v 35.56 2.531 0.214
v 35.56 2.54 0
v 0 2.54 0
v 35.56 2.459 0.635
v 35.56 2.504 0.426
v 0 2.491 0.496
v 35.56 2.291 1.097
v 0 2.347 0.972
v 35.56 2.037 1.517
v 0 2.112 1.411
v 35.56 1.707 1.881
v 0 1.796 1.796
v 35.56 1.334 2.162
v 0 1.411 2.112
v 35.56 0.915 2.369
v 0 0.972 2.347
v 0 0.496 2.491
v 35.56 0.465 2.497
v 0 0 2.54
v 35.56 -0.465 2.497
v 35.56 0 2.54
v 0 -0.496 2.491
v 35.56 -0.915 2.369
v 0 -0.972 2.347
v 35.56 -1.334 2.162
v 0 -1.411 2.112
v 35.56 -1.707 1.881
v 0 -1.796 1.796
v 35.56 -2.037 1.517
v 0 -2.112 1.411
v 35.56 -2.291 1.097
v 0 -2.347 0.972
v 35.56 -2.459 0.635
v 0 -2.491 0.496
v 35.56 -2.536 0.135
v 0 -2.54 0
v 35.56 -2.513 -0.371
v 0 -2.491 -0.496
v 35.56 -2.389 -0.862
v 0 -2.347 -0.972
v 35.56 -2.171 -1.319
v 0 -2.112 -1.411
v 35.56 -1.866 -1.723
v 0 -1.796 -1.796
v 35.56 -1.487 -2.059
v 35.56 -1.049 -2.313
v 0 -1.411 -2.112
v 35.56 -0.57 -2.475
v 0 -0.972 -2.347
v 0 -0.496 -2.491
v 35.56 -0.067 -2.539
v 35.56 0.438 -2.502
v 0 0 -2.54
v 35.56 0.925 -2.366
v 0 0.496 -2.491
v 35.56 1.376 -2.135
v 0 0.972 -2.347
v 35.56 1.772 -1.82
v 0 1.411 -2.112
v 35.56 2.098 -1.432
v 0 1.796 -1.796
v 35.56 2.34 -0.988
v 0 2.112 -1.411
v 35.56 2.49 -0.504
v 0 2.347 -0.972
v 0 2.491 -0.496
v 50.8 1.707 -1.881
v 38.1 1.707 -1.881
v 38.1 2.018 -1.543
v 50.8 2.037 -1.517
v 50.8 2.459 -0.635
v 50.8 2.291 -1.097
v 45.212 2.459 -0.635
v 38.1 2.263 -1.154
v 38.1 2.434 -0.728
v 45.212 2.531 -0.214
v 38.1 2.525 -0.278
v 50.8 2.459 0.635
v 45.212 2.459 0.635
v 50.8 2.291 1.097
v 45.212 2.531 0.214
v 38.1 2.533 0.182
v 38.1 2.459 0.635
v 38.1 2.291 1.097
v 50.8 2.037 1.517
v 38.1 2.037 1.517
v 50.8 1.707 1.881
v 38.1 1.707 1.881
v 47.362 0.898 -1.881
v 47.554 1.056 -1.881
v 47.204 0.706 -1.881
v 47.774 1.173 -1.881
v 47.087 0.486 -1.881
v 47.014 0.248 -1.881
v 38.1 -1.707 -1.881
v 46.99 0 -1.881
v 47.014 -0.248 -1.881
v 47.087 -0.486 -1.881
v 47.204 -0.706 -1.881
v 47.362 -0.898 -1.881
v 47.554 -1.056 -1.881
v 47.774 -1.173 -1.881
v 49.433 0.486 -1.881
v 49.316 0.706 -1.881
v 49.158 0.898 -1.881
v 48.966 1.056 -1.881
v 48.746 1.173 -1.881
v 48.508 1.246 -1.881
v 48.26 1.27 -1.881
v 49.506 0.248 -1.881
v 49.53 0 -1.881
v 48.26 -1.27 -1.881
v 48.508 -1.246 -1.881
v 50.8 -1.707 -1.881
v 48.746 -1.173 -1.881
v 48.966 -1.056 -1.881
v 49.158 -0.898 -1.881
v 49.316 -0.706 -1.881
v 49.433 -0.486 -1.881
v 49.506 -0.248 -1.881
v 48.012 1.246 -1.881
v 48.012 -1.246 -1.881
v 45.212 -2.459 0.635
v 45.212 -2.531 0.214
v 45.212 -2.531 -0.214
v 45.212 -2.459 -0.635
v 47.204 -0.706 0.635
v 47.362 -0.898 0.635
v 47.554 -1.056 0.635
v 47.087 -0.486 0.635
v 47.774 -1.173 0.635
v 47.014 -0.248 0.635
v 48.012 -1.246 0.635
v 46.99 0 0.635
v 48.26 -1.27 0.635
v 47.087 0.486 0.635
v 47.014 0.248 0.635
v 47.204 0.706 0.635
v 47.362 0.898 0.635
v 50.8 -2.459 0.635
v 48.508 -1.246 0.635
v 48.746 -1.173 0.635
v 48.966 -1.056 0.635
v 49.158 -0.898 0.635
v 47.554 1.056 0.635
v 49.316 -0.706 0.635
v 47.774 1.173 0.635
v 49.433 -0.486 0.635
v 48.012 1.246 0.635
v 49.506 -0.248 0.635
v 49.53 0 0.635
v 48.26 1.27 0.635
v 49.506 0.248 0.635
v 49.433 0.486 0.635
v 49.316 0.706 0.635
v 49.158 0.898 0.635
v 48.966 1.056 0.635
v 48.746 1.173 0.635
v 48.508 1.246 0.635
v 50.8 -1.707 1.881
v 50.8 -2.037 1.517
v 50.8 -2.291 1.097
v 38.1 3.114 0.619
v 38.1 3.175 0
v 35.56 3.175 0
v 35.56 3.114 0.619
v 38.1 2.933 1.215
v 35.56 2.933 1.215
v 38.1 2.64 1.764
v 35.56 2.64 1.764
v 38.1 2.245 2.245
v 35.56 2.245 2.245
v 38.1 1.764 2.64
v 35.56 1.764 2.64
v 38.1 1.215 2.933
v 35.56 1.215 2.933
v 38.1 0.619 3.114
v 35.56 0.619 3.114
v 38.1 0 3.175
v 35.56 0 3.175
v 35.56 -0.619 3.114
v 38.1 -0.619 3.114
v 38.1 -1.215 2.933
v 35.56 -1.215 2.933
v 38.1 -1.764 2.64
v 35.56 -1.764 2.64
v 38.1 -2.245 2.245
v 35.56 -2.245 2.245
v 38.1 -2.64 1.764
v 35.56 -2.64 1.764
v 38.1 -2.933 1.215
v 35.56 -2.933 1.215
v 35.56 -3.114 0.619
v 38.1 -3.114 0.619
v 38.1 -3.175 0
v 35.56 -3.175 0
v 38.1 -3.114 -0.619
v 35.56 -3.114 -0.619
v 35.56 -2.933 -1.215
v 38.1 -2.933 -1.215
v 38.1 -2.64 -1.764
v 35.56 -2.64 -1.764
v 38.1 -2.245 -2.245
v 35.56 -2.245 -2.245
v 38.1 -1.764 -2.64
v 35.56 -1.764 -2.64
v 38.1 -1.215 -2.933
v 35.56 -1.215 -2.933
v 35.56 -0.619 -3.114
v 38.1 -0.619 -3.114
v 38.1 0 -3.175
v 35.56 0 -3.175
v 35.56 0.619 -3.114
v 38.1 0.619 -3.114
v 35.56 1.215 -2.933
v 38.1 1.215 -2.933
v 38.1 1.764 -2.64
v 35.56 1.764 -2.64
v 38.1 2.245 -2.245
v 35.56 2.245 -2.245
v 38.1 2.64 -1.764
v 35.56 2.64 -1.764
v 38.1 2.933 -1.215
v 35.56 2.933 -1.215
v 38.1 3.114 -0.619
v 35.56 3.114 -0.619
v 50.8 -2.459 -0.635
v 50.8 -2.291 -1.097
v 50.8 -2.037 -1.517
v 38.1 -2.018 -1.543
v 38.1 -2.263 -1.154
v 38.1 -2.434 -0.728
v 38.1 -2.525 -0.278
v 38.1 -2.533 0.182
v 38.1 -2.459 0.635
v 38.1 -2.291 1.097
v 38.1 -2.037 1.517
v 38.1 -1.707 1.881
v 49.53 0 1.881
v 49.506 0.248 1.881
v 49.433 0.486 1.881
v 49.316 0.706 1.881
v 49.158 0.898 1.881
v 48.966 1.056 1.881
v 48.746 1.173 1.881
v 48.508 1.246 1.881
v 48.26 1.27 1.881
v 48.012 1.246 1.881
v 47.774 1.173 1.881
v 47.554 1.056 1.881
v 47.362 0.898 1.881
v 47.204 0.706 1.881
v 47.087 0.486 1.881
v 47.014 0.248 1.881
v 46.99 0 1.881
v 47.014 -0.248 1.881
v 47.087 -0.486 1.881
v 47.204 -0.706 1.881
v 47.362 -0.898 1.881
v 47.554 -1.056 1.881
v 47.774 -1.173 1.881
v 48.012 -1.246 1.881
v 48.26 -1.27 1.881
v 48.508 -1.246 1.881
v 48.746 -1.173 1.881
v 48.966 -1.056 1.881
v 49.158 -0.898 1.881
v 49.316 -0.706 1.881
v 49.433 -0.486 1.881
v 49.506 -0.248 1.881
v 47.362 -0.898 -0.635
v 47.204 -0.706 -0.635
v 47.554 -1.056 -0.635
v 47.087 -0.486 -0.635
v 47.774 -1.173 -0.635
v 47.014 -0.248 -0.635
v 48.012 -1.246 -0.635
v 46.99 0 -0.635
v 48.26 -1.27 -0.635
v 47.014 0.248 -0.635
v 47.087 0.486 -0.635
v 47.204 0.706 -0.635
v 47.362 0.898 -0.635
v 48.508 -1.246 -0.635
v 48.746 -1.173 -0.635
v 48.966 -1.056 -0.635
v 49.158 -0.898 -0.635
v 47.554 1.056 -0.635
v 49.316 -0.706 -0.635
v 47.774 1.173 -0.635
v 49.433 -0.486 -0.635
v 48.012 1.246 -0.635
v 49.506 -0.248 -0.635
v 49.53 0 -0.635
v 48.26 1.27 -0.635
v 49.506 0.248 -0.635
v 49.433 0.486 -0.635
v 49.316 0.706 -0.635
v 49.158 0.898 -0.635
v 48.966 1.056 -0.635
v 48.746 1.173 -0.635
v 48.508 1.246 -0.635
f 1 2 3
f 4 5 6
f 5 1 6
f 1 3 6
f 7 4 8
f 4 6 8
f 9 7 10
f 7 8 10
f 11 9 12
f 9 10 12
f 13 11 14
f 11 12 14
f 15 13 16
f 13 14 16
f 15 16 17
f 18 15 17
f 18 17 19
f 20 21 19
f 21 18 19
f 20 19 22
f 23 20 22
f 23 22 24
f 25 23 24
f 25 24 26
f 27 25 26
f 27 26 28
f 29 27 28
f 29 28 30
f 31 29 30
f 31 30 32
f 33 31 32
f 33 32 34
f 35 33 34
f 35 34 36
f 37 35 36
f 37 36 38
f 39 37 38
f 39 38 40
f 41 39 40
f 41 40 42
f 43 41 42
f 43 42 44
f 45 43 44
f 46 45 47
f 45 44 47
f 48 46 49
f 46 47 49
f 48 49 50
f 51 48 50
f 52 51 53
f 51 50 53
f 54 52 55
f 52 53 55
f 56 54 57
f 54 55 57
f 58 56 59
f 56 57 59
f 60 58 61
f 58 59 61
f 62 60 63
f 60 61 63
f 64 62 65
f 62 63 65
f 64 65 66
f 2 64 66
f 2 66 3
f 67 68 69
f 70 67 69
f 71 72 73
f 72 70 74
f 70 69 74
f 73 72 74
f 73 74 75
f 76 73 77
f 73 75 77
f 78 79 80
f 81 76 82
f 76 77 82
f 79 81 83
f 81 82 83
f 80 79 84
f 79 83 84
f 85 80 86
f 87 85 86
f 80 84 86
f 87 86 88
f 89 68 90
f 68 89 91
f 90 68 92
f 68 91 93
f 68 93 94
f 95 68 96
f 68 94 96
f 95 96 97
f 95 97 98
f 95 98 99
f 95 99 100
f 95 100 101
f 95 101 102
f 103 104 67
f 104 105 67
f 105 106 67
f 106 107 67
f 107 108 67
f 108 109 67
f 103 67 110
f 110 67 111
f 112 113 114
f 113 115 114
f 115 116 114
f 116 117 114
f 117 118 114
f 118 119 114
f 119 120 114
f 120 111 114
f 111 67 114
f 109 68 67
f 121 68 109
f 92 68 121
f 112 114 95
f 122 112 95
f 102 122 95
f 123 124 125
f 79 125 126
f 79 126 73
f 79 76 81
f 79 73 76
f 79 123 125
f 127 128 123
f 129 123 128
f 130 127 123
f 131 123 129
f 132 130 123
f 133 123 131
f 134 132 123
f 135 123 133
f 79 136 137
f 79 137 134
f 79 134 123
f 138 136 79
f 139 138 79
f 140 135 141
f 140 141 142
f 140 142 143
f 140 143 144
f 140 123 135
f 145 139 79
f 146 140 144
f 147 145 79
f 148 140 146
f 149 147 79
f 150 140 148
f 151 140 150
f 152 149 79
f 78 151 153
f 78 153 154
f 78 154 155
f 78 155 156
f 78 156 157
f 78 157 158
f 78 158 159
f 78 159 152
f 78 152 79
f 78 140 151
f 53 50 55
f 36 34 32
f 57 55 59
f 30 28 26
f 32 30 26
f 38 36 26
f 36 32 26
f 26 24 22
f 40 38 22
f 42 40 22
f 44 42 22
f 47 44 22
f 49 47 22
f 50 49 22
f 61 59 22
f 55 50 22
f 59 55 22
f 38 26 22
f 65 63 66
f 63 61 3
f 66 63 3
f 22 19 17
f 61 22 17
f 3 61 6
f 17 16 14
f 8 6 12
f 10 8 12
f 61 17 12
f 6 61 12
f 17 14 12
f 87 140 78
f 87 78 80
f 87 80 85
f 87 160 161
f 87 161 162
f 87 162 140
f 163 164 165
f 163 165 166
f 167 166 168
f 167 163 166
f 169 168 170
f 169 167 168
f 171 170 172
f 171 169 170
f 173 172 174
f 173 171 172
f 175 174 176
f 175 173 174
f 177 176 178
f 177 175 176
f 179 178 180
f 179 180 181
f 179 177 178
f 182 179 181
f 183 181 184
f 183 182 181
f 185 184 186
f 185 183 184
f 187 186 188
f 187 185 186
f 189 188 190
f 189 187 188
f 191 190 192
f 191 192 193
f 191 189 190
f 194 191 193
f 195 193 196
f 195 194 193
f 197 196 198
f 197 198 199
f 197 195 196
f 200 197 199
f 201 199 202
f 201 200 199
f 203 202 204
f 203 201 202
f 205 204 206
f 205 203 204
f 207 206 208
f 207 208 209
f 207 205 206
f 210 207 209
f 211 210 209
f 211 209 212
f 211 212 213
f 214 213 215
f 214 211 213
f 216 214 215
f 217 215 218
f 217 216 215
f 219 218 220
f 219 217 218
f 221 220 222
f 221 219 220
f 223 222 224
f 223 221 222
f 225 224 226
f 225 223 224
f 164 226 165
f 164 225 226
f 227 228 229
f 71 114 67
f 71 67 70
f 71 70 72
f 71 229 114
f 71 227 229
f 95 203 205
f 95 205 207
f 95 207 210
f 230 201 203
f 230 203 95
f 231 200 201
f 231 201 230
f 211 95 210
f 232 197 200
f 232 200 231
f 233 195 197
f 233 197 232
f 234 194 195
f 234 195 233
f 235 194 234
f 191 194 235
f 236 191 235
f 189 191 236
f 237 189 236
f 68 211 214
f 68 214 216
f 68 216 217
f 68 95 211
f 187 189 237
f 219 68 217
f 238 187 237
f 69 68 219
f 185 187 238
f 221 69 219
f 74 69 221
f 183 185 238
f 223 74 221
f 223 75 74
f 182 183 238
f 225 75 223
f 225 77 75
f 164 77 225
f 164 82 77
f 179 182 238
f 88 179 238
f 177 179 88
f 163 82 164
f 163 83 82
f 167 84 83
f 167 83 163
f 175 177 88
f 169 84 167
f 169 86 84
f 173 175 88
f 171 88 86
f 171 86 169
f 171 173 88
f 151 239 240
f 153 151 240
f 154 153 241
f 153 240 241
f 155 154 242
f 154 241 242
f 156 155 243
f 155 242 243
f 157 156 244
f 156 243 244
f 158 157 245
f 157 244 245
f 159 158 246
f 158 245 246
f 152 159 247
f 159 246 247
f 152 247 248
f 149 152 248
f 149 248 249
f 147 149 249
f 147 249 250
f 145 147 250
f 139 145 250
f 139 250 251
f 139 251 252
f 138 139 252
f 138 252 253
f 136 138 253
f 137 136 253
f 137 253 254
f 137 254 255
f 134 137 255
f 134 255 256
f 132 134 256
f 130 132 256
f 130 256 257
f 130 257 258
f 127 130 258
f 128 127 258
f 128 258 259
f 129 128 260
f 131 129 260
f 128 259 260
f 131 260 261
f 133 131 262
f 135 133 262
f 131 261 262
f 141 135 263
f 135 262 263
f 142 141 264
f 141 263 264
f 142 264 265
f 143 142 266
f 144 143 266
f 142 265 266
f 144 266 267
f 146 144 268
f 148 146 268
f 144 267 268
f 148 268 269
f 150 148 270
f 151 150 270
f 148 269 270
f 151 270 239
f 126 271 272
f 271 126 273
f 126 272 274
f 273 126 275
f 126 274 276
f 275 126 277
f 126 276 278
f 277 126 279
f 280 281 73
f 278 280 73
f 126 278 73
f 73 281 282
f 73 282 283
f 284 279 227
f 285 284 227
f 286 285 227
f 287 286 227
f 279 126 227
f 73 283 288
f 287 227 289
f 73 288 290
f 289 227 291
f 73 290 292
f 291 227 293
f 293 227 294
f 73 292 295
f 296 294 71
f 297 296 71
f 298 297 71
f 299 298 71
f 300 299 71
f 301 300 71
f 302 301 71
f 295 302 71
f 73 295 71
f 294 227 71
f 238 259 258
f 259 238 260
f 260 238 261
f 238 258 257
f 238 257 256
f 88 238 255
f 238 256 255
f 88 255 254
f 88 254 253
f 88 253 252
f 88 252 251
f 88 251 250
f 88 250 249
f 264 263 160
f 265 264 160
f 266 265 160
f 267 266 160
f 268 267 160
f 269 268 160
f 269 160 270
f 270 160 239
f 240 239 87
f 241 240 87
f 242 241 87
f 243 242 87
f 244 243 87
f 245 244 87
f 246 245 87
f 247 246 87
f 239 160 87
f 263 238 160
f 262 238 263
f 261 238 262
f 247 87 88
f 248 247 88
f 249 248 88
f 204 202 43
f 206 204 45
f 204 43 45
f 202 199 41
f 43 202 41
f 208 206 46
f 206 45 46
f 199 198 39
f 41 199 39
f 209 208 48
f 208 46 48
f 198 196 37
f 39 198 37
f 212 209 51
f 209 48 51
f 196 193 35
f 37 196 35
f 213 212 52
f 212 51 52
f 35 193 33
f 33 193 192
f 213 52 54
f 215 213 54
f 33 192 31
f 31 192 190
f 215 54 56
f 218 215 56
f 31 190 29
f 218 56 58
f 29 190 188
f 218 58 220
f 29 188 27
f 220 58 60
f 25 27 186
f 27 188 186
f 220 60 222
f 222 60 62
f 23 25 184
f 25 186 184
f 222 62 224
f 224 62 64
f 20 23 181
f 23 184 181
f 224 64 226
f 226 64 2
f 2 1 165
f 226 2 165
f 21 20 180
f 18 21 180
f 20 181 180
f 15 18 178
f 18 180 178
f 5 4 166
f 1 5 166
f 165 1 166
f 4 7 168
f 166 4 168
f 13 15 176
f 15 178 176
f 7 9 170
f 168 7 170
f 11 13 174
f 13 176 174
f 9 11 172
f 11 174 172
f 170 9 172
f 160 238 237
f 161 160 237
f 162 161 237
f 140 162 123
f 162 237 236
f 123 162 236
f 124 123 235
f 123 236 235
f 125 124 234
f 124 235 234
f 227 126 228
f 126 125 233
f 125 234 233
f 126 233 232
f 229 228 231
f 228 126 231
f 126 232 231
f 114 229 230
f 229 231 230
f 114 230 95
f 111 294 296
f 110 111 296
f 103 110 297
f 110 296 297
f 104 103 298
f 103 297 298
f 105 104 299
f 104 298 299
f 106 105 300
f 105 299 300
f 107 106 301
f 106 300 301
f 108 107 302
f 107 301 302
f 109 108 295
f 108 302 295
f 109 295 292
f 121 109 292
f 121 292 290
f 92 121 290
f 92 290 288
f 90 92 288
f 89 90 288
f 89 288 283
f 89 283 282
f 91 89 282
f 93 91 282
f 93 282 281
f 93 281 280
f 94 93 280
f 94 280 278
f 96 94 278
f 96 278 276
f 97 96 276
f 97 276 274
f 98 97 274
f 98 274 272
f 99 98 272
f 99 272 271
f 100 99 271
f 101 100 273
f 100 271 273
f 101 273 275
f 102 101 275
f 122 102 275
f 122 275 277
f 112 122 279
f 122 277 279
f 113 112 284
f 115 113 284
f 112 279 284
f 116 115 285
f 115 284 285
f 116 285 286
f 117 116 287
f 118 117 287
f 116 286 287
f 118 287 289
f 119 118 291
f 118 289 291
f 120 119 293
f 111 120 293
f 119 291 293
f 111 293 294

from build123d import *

# Parameters (mm, degrees)
F0_R     = 2.54
F1_DEPTH = 50.8
F3_DEPTH = 12.7
F4_W     = 5.3957496343
F4_H     = 1.27
F5_DEPTH = 5.588
F6_R     = 1.27
F7_DEPTH = 25.4
F9_START = -12.7
F8_R     = 3.175
F9_DEPTH = 2.54


with BuildPart() as f1:
    # F0 (on Right) → F1 (new body)
    with BuildSketch(Plane.YZ):
        Circle(F0_R)
    extrude(amount=F1_DEPTH)

    # F2 (on face) → F3 (cut)
    with BuildSketch(Plane.YZ.offset(50.8)):
        with BuildLine():
            Line((1.7070901198, -3.1991907798), (1.7070901198, -1.8808092202))
            ThreePointArc((1.7070901198, -1.8808092202), (0, -2.54), (-1.7070901198, -1.8808092202))
            Line((-1.7070901198, -1.8808092202), (-1.7070901198, -3.1991907798))
            Line((-1.7070901198, -3.1991907798), (1.7070901198, -3.1991907798))
        make_face()
        with BuildLine():
            ThreePointArc((-1.7070901198, -1.8808092202), (0, -2.54), (1.7070901198, -1.8808092202))
            Line((1.7070901198, -1.8808092202), (-1.7070901198, -1.8808092202))
        make_face()
        with BuildLine():
            Line((-1.7070901198, 1.8808092202), (1.7070901198, 1.8808092202))
            ThreePointArc((1.7070901198, 1.8808092202), (0, 2.54), (-1.7070901198, 1.8808092202))
        make_face()
        with BuildLine():
            ThreePointArc((-1.7070901198, 1.8808092202), (0, 2.54), (1.7070901198, 1.8808092202))
            Line((1.7070901198, 1.8808092202), (1.7070901198, 3.1991907798))
            Line((1.7070901198, 3.1991907798), (-1.7070901198, 3.1991907798))
            Line((-1.7070901198, 3.1991907798), (-1.7070901198, 1.8808092202))
        make_face()
    extrude(amount=-F3_DEPTH, mode=Mode.SUBTRACT)

    # F4 (on face) → F5 (cut)
    with BuildSketch(Plane.YZ.offset(50.8)):
        Rectangle(F4_W, F4_H)
    extrude(amount=-F5_DEPTH, mode=Mode.SUBTRACT)

    # F6 (on face) → F7 (cut)
    with BuildSketch(Plane.XY.offset(1.8808092202)):
        with Locations((48.26, 0)):
            Circle(F6_R)
    extrude(amount=-F7_DEPTH, mode=Mode.SUBTRACT)

    # F8 (on face) → F9 (join)
    with BuildSketch(Plane.YZ.offset(50.8).offset(F9_START)):
        Circle(F8_R)
        with BuildLine():
            Line((2.4593444248, 0.635), (-2.4593444248, 0.635))
            ThreePointArc((-2.4593444248, 0.635), (-2.1743514797, 1.3129339827), (-1.7070901198, 1.8808092202))
            Line((-1.7070901198, 1.8808092202), (1.7070901198, 1.8808092202))
            ThreePointArc((1.7070901198, 1.8808092202), (2.1743514797, 1.3129339827), (2.4593444248, 0.635))
        make_face(mode=Mode.SUBTRACT)
    extrude(amount=-F9_DEPTH)


solid = f1.part
